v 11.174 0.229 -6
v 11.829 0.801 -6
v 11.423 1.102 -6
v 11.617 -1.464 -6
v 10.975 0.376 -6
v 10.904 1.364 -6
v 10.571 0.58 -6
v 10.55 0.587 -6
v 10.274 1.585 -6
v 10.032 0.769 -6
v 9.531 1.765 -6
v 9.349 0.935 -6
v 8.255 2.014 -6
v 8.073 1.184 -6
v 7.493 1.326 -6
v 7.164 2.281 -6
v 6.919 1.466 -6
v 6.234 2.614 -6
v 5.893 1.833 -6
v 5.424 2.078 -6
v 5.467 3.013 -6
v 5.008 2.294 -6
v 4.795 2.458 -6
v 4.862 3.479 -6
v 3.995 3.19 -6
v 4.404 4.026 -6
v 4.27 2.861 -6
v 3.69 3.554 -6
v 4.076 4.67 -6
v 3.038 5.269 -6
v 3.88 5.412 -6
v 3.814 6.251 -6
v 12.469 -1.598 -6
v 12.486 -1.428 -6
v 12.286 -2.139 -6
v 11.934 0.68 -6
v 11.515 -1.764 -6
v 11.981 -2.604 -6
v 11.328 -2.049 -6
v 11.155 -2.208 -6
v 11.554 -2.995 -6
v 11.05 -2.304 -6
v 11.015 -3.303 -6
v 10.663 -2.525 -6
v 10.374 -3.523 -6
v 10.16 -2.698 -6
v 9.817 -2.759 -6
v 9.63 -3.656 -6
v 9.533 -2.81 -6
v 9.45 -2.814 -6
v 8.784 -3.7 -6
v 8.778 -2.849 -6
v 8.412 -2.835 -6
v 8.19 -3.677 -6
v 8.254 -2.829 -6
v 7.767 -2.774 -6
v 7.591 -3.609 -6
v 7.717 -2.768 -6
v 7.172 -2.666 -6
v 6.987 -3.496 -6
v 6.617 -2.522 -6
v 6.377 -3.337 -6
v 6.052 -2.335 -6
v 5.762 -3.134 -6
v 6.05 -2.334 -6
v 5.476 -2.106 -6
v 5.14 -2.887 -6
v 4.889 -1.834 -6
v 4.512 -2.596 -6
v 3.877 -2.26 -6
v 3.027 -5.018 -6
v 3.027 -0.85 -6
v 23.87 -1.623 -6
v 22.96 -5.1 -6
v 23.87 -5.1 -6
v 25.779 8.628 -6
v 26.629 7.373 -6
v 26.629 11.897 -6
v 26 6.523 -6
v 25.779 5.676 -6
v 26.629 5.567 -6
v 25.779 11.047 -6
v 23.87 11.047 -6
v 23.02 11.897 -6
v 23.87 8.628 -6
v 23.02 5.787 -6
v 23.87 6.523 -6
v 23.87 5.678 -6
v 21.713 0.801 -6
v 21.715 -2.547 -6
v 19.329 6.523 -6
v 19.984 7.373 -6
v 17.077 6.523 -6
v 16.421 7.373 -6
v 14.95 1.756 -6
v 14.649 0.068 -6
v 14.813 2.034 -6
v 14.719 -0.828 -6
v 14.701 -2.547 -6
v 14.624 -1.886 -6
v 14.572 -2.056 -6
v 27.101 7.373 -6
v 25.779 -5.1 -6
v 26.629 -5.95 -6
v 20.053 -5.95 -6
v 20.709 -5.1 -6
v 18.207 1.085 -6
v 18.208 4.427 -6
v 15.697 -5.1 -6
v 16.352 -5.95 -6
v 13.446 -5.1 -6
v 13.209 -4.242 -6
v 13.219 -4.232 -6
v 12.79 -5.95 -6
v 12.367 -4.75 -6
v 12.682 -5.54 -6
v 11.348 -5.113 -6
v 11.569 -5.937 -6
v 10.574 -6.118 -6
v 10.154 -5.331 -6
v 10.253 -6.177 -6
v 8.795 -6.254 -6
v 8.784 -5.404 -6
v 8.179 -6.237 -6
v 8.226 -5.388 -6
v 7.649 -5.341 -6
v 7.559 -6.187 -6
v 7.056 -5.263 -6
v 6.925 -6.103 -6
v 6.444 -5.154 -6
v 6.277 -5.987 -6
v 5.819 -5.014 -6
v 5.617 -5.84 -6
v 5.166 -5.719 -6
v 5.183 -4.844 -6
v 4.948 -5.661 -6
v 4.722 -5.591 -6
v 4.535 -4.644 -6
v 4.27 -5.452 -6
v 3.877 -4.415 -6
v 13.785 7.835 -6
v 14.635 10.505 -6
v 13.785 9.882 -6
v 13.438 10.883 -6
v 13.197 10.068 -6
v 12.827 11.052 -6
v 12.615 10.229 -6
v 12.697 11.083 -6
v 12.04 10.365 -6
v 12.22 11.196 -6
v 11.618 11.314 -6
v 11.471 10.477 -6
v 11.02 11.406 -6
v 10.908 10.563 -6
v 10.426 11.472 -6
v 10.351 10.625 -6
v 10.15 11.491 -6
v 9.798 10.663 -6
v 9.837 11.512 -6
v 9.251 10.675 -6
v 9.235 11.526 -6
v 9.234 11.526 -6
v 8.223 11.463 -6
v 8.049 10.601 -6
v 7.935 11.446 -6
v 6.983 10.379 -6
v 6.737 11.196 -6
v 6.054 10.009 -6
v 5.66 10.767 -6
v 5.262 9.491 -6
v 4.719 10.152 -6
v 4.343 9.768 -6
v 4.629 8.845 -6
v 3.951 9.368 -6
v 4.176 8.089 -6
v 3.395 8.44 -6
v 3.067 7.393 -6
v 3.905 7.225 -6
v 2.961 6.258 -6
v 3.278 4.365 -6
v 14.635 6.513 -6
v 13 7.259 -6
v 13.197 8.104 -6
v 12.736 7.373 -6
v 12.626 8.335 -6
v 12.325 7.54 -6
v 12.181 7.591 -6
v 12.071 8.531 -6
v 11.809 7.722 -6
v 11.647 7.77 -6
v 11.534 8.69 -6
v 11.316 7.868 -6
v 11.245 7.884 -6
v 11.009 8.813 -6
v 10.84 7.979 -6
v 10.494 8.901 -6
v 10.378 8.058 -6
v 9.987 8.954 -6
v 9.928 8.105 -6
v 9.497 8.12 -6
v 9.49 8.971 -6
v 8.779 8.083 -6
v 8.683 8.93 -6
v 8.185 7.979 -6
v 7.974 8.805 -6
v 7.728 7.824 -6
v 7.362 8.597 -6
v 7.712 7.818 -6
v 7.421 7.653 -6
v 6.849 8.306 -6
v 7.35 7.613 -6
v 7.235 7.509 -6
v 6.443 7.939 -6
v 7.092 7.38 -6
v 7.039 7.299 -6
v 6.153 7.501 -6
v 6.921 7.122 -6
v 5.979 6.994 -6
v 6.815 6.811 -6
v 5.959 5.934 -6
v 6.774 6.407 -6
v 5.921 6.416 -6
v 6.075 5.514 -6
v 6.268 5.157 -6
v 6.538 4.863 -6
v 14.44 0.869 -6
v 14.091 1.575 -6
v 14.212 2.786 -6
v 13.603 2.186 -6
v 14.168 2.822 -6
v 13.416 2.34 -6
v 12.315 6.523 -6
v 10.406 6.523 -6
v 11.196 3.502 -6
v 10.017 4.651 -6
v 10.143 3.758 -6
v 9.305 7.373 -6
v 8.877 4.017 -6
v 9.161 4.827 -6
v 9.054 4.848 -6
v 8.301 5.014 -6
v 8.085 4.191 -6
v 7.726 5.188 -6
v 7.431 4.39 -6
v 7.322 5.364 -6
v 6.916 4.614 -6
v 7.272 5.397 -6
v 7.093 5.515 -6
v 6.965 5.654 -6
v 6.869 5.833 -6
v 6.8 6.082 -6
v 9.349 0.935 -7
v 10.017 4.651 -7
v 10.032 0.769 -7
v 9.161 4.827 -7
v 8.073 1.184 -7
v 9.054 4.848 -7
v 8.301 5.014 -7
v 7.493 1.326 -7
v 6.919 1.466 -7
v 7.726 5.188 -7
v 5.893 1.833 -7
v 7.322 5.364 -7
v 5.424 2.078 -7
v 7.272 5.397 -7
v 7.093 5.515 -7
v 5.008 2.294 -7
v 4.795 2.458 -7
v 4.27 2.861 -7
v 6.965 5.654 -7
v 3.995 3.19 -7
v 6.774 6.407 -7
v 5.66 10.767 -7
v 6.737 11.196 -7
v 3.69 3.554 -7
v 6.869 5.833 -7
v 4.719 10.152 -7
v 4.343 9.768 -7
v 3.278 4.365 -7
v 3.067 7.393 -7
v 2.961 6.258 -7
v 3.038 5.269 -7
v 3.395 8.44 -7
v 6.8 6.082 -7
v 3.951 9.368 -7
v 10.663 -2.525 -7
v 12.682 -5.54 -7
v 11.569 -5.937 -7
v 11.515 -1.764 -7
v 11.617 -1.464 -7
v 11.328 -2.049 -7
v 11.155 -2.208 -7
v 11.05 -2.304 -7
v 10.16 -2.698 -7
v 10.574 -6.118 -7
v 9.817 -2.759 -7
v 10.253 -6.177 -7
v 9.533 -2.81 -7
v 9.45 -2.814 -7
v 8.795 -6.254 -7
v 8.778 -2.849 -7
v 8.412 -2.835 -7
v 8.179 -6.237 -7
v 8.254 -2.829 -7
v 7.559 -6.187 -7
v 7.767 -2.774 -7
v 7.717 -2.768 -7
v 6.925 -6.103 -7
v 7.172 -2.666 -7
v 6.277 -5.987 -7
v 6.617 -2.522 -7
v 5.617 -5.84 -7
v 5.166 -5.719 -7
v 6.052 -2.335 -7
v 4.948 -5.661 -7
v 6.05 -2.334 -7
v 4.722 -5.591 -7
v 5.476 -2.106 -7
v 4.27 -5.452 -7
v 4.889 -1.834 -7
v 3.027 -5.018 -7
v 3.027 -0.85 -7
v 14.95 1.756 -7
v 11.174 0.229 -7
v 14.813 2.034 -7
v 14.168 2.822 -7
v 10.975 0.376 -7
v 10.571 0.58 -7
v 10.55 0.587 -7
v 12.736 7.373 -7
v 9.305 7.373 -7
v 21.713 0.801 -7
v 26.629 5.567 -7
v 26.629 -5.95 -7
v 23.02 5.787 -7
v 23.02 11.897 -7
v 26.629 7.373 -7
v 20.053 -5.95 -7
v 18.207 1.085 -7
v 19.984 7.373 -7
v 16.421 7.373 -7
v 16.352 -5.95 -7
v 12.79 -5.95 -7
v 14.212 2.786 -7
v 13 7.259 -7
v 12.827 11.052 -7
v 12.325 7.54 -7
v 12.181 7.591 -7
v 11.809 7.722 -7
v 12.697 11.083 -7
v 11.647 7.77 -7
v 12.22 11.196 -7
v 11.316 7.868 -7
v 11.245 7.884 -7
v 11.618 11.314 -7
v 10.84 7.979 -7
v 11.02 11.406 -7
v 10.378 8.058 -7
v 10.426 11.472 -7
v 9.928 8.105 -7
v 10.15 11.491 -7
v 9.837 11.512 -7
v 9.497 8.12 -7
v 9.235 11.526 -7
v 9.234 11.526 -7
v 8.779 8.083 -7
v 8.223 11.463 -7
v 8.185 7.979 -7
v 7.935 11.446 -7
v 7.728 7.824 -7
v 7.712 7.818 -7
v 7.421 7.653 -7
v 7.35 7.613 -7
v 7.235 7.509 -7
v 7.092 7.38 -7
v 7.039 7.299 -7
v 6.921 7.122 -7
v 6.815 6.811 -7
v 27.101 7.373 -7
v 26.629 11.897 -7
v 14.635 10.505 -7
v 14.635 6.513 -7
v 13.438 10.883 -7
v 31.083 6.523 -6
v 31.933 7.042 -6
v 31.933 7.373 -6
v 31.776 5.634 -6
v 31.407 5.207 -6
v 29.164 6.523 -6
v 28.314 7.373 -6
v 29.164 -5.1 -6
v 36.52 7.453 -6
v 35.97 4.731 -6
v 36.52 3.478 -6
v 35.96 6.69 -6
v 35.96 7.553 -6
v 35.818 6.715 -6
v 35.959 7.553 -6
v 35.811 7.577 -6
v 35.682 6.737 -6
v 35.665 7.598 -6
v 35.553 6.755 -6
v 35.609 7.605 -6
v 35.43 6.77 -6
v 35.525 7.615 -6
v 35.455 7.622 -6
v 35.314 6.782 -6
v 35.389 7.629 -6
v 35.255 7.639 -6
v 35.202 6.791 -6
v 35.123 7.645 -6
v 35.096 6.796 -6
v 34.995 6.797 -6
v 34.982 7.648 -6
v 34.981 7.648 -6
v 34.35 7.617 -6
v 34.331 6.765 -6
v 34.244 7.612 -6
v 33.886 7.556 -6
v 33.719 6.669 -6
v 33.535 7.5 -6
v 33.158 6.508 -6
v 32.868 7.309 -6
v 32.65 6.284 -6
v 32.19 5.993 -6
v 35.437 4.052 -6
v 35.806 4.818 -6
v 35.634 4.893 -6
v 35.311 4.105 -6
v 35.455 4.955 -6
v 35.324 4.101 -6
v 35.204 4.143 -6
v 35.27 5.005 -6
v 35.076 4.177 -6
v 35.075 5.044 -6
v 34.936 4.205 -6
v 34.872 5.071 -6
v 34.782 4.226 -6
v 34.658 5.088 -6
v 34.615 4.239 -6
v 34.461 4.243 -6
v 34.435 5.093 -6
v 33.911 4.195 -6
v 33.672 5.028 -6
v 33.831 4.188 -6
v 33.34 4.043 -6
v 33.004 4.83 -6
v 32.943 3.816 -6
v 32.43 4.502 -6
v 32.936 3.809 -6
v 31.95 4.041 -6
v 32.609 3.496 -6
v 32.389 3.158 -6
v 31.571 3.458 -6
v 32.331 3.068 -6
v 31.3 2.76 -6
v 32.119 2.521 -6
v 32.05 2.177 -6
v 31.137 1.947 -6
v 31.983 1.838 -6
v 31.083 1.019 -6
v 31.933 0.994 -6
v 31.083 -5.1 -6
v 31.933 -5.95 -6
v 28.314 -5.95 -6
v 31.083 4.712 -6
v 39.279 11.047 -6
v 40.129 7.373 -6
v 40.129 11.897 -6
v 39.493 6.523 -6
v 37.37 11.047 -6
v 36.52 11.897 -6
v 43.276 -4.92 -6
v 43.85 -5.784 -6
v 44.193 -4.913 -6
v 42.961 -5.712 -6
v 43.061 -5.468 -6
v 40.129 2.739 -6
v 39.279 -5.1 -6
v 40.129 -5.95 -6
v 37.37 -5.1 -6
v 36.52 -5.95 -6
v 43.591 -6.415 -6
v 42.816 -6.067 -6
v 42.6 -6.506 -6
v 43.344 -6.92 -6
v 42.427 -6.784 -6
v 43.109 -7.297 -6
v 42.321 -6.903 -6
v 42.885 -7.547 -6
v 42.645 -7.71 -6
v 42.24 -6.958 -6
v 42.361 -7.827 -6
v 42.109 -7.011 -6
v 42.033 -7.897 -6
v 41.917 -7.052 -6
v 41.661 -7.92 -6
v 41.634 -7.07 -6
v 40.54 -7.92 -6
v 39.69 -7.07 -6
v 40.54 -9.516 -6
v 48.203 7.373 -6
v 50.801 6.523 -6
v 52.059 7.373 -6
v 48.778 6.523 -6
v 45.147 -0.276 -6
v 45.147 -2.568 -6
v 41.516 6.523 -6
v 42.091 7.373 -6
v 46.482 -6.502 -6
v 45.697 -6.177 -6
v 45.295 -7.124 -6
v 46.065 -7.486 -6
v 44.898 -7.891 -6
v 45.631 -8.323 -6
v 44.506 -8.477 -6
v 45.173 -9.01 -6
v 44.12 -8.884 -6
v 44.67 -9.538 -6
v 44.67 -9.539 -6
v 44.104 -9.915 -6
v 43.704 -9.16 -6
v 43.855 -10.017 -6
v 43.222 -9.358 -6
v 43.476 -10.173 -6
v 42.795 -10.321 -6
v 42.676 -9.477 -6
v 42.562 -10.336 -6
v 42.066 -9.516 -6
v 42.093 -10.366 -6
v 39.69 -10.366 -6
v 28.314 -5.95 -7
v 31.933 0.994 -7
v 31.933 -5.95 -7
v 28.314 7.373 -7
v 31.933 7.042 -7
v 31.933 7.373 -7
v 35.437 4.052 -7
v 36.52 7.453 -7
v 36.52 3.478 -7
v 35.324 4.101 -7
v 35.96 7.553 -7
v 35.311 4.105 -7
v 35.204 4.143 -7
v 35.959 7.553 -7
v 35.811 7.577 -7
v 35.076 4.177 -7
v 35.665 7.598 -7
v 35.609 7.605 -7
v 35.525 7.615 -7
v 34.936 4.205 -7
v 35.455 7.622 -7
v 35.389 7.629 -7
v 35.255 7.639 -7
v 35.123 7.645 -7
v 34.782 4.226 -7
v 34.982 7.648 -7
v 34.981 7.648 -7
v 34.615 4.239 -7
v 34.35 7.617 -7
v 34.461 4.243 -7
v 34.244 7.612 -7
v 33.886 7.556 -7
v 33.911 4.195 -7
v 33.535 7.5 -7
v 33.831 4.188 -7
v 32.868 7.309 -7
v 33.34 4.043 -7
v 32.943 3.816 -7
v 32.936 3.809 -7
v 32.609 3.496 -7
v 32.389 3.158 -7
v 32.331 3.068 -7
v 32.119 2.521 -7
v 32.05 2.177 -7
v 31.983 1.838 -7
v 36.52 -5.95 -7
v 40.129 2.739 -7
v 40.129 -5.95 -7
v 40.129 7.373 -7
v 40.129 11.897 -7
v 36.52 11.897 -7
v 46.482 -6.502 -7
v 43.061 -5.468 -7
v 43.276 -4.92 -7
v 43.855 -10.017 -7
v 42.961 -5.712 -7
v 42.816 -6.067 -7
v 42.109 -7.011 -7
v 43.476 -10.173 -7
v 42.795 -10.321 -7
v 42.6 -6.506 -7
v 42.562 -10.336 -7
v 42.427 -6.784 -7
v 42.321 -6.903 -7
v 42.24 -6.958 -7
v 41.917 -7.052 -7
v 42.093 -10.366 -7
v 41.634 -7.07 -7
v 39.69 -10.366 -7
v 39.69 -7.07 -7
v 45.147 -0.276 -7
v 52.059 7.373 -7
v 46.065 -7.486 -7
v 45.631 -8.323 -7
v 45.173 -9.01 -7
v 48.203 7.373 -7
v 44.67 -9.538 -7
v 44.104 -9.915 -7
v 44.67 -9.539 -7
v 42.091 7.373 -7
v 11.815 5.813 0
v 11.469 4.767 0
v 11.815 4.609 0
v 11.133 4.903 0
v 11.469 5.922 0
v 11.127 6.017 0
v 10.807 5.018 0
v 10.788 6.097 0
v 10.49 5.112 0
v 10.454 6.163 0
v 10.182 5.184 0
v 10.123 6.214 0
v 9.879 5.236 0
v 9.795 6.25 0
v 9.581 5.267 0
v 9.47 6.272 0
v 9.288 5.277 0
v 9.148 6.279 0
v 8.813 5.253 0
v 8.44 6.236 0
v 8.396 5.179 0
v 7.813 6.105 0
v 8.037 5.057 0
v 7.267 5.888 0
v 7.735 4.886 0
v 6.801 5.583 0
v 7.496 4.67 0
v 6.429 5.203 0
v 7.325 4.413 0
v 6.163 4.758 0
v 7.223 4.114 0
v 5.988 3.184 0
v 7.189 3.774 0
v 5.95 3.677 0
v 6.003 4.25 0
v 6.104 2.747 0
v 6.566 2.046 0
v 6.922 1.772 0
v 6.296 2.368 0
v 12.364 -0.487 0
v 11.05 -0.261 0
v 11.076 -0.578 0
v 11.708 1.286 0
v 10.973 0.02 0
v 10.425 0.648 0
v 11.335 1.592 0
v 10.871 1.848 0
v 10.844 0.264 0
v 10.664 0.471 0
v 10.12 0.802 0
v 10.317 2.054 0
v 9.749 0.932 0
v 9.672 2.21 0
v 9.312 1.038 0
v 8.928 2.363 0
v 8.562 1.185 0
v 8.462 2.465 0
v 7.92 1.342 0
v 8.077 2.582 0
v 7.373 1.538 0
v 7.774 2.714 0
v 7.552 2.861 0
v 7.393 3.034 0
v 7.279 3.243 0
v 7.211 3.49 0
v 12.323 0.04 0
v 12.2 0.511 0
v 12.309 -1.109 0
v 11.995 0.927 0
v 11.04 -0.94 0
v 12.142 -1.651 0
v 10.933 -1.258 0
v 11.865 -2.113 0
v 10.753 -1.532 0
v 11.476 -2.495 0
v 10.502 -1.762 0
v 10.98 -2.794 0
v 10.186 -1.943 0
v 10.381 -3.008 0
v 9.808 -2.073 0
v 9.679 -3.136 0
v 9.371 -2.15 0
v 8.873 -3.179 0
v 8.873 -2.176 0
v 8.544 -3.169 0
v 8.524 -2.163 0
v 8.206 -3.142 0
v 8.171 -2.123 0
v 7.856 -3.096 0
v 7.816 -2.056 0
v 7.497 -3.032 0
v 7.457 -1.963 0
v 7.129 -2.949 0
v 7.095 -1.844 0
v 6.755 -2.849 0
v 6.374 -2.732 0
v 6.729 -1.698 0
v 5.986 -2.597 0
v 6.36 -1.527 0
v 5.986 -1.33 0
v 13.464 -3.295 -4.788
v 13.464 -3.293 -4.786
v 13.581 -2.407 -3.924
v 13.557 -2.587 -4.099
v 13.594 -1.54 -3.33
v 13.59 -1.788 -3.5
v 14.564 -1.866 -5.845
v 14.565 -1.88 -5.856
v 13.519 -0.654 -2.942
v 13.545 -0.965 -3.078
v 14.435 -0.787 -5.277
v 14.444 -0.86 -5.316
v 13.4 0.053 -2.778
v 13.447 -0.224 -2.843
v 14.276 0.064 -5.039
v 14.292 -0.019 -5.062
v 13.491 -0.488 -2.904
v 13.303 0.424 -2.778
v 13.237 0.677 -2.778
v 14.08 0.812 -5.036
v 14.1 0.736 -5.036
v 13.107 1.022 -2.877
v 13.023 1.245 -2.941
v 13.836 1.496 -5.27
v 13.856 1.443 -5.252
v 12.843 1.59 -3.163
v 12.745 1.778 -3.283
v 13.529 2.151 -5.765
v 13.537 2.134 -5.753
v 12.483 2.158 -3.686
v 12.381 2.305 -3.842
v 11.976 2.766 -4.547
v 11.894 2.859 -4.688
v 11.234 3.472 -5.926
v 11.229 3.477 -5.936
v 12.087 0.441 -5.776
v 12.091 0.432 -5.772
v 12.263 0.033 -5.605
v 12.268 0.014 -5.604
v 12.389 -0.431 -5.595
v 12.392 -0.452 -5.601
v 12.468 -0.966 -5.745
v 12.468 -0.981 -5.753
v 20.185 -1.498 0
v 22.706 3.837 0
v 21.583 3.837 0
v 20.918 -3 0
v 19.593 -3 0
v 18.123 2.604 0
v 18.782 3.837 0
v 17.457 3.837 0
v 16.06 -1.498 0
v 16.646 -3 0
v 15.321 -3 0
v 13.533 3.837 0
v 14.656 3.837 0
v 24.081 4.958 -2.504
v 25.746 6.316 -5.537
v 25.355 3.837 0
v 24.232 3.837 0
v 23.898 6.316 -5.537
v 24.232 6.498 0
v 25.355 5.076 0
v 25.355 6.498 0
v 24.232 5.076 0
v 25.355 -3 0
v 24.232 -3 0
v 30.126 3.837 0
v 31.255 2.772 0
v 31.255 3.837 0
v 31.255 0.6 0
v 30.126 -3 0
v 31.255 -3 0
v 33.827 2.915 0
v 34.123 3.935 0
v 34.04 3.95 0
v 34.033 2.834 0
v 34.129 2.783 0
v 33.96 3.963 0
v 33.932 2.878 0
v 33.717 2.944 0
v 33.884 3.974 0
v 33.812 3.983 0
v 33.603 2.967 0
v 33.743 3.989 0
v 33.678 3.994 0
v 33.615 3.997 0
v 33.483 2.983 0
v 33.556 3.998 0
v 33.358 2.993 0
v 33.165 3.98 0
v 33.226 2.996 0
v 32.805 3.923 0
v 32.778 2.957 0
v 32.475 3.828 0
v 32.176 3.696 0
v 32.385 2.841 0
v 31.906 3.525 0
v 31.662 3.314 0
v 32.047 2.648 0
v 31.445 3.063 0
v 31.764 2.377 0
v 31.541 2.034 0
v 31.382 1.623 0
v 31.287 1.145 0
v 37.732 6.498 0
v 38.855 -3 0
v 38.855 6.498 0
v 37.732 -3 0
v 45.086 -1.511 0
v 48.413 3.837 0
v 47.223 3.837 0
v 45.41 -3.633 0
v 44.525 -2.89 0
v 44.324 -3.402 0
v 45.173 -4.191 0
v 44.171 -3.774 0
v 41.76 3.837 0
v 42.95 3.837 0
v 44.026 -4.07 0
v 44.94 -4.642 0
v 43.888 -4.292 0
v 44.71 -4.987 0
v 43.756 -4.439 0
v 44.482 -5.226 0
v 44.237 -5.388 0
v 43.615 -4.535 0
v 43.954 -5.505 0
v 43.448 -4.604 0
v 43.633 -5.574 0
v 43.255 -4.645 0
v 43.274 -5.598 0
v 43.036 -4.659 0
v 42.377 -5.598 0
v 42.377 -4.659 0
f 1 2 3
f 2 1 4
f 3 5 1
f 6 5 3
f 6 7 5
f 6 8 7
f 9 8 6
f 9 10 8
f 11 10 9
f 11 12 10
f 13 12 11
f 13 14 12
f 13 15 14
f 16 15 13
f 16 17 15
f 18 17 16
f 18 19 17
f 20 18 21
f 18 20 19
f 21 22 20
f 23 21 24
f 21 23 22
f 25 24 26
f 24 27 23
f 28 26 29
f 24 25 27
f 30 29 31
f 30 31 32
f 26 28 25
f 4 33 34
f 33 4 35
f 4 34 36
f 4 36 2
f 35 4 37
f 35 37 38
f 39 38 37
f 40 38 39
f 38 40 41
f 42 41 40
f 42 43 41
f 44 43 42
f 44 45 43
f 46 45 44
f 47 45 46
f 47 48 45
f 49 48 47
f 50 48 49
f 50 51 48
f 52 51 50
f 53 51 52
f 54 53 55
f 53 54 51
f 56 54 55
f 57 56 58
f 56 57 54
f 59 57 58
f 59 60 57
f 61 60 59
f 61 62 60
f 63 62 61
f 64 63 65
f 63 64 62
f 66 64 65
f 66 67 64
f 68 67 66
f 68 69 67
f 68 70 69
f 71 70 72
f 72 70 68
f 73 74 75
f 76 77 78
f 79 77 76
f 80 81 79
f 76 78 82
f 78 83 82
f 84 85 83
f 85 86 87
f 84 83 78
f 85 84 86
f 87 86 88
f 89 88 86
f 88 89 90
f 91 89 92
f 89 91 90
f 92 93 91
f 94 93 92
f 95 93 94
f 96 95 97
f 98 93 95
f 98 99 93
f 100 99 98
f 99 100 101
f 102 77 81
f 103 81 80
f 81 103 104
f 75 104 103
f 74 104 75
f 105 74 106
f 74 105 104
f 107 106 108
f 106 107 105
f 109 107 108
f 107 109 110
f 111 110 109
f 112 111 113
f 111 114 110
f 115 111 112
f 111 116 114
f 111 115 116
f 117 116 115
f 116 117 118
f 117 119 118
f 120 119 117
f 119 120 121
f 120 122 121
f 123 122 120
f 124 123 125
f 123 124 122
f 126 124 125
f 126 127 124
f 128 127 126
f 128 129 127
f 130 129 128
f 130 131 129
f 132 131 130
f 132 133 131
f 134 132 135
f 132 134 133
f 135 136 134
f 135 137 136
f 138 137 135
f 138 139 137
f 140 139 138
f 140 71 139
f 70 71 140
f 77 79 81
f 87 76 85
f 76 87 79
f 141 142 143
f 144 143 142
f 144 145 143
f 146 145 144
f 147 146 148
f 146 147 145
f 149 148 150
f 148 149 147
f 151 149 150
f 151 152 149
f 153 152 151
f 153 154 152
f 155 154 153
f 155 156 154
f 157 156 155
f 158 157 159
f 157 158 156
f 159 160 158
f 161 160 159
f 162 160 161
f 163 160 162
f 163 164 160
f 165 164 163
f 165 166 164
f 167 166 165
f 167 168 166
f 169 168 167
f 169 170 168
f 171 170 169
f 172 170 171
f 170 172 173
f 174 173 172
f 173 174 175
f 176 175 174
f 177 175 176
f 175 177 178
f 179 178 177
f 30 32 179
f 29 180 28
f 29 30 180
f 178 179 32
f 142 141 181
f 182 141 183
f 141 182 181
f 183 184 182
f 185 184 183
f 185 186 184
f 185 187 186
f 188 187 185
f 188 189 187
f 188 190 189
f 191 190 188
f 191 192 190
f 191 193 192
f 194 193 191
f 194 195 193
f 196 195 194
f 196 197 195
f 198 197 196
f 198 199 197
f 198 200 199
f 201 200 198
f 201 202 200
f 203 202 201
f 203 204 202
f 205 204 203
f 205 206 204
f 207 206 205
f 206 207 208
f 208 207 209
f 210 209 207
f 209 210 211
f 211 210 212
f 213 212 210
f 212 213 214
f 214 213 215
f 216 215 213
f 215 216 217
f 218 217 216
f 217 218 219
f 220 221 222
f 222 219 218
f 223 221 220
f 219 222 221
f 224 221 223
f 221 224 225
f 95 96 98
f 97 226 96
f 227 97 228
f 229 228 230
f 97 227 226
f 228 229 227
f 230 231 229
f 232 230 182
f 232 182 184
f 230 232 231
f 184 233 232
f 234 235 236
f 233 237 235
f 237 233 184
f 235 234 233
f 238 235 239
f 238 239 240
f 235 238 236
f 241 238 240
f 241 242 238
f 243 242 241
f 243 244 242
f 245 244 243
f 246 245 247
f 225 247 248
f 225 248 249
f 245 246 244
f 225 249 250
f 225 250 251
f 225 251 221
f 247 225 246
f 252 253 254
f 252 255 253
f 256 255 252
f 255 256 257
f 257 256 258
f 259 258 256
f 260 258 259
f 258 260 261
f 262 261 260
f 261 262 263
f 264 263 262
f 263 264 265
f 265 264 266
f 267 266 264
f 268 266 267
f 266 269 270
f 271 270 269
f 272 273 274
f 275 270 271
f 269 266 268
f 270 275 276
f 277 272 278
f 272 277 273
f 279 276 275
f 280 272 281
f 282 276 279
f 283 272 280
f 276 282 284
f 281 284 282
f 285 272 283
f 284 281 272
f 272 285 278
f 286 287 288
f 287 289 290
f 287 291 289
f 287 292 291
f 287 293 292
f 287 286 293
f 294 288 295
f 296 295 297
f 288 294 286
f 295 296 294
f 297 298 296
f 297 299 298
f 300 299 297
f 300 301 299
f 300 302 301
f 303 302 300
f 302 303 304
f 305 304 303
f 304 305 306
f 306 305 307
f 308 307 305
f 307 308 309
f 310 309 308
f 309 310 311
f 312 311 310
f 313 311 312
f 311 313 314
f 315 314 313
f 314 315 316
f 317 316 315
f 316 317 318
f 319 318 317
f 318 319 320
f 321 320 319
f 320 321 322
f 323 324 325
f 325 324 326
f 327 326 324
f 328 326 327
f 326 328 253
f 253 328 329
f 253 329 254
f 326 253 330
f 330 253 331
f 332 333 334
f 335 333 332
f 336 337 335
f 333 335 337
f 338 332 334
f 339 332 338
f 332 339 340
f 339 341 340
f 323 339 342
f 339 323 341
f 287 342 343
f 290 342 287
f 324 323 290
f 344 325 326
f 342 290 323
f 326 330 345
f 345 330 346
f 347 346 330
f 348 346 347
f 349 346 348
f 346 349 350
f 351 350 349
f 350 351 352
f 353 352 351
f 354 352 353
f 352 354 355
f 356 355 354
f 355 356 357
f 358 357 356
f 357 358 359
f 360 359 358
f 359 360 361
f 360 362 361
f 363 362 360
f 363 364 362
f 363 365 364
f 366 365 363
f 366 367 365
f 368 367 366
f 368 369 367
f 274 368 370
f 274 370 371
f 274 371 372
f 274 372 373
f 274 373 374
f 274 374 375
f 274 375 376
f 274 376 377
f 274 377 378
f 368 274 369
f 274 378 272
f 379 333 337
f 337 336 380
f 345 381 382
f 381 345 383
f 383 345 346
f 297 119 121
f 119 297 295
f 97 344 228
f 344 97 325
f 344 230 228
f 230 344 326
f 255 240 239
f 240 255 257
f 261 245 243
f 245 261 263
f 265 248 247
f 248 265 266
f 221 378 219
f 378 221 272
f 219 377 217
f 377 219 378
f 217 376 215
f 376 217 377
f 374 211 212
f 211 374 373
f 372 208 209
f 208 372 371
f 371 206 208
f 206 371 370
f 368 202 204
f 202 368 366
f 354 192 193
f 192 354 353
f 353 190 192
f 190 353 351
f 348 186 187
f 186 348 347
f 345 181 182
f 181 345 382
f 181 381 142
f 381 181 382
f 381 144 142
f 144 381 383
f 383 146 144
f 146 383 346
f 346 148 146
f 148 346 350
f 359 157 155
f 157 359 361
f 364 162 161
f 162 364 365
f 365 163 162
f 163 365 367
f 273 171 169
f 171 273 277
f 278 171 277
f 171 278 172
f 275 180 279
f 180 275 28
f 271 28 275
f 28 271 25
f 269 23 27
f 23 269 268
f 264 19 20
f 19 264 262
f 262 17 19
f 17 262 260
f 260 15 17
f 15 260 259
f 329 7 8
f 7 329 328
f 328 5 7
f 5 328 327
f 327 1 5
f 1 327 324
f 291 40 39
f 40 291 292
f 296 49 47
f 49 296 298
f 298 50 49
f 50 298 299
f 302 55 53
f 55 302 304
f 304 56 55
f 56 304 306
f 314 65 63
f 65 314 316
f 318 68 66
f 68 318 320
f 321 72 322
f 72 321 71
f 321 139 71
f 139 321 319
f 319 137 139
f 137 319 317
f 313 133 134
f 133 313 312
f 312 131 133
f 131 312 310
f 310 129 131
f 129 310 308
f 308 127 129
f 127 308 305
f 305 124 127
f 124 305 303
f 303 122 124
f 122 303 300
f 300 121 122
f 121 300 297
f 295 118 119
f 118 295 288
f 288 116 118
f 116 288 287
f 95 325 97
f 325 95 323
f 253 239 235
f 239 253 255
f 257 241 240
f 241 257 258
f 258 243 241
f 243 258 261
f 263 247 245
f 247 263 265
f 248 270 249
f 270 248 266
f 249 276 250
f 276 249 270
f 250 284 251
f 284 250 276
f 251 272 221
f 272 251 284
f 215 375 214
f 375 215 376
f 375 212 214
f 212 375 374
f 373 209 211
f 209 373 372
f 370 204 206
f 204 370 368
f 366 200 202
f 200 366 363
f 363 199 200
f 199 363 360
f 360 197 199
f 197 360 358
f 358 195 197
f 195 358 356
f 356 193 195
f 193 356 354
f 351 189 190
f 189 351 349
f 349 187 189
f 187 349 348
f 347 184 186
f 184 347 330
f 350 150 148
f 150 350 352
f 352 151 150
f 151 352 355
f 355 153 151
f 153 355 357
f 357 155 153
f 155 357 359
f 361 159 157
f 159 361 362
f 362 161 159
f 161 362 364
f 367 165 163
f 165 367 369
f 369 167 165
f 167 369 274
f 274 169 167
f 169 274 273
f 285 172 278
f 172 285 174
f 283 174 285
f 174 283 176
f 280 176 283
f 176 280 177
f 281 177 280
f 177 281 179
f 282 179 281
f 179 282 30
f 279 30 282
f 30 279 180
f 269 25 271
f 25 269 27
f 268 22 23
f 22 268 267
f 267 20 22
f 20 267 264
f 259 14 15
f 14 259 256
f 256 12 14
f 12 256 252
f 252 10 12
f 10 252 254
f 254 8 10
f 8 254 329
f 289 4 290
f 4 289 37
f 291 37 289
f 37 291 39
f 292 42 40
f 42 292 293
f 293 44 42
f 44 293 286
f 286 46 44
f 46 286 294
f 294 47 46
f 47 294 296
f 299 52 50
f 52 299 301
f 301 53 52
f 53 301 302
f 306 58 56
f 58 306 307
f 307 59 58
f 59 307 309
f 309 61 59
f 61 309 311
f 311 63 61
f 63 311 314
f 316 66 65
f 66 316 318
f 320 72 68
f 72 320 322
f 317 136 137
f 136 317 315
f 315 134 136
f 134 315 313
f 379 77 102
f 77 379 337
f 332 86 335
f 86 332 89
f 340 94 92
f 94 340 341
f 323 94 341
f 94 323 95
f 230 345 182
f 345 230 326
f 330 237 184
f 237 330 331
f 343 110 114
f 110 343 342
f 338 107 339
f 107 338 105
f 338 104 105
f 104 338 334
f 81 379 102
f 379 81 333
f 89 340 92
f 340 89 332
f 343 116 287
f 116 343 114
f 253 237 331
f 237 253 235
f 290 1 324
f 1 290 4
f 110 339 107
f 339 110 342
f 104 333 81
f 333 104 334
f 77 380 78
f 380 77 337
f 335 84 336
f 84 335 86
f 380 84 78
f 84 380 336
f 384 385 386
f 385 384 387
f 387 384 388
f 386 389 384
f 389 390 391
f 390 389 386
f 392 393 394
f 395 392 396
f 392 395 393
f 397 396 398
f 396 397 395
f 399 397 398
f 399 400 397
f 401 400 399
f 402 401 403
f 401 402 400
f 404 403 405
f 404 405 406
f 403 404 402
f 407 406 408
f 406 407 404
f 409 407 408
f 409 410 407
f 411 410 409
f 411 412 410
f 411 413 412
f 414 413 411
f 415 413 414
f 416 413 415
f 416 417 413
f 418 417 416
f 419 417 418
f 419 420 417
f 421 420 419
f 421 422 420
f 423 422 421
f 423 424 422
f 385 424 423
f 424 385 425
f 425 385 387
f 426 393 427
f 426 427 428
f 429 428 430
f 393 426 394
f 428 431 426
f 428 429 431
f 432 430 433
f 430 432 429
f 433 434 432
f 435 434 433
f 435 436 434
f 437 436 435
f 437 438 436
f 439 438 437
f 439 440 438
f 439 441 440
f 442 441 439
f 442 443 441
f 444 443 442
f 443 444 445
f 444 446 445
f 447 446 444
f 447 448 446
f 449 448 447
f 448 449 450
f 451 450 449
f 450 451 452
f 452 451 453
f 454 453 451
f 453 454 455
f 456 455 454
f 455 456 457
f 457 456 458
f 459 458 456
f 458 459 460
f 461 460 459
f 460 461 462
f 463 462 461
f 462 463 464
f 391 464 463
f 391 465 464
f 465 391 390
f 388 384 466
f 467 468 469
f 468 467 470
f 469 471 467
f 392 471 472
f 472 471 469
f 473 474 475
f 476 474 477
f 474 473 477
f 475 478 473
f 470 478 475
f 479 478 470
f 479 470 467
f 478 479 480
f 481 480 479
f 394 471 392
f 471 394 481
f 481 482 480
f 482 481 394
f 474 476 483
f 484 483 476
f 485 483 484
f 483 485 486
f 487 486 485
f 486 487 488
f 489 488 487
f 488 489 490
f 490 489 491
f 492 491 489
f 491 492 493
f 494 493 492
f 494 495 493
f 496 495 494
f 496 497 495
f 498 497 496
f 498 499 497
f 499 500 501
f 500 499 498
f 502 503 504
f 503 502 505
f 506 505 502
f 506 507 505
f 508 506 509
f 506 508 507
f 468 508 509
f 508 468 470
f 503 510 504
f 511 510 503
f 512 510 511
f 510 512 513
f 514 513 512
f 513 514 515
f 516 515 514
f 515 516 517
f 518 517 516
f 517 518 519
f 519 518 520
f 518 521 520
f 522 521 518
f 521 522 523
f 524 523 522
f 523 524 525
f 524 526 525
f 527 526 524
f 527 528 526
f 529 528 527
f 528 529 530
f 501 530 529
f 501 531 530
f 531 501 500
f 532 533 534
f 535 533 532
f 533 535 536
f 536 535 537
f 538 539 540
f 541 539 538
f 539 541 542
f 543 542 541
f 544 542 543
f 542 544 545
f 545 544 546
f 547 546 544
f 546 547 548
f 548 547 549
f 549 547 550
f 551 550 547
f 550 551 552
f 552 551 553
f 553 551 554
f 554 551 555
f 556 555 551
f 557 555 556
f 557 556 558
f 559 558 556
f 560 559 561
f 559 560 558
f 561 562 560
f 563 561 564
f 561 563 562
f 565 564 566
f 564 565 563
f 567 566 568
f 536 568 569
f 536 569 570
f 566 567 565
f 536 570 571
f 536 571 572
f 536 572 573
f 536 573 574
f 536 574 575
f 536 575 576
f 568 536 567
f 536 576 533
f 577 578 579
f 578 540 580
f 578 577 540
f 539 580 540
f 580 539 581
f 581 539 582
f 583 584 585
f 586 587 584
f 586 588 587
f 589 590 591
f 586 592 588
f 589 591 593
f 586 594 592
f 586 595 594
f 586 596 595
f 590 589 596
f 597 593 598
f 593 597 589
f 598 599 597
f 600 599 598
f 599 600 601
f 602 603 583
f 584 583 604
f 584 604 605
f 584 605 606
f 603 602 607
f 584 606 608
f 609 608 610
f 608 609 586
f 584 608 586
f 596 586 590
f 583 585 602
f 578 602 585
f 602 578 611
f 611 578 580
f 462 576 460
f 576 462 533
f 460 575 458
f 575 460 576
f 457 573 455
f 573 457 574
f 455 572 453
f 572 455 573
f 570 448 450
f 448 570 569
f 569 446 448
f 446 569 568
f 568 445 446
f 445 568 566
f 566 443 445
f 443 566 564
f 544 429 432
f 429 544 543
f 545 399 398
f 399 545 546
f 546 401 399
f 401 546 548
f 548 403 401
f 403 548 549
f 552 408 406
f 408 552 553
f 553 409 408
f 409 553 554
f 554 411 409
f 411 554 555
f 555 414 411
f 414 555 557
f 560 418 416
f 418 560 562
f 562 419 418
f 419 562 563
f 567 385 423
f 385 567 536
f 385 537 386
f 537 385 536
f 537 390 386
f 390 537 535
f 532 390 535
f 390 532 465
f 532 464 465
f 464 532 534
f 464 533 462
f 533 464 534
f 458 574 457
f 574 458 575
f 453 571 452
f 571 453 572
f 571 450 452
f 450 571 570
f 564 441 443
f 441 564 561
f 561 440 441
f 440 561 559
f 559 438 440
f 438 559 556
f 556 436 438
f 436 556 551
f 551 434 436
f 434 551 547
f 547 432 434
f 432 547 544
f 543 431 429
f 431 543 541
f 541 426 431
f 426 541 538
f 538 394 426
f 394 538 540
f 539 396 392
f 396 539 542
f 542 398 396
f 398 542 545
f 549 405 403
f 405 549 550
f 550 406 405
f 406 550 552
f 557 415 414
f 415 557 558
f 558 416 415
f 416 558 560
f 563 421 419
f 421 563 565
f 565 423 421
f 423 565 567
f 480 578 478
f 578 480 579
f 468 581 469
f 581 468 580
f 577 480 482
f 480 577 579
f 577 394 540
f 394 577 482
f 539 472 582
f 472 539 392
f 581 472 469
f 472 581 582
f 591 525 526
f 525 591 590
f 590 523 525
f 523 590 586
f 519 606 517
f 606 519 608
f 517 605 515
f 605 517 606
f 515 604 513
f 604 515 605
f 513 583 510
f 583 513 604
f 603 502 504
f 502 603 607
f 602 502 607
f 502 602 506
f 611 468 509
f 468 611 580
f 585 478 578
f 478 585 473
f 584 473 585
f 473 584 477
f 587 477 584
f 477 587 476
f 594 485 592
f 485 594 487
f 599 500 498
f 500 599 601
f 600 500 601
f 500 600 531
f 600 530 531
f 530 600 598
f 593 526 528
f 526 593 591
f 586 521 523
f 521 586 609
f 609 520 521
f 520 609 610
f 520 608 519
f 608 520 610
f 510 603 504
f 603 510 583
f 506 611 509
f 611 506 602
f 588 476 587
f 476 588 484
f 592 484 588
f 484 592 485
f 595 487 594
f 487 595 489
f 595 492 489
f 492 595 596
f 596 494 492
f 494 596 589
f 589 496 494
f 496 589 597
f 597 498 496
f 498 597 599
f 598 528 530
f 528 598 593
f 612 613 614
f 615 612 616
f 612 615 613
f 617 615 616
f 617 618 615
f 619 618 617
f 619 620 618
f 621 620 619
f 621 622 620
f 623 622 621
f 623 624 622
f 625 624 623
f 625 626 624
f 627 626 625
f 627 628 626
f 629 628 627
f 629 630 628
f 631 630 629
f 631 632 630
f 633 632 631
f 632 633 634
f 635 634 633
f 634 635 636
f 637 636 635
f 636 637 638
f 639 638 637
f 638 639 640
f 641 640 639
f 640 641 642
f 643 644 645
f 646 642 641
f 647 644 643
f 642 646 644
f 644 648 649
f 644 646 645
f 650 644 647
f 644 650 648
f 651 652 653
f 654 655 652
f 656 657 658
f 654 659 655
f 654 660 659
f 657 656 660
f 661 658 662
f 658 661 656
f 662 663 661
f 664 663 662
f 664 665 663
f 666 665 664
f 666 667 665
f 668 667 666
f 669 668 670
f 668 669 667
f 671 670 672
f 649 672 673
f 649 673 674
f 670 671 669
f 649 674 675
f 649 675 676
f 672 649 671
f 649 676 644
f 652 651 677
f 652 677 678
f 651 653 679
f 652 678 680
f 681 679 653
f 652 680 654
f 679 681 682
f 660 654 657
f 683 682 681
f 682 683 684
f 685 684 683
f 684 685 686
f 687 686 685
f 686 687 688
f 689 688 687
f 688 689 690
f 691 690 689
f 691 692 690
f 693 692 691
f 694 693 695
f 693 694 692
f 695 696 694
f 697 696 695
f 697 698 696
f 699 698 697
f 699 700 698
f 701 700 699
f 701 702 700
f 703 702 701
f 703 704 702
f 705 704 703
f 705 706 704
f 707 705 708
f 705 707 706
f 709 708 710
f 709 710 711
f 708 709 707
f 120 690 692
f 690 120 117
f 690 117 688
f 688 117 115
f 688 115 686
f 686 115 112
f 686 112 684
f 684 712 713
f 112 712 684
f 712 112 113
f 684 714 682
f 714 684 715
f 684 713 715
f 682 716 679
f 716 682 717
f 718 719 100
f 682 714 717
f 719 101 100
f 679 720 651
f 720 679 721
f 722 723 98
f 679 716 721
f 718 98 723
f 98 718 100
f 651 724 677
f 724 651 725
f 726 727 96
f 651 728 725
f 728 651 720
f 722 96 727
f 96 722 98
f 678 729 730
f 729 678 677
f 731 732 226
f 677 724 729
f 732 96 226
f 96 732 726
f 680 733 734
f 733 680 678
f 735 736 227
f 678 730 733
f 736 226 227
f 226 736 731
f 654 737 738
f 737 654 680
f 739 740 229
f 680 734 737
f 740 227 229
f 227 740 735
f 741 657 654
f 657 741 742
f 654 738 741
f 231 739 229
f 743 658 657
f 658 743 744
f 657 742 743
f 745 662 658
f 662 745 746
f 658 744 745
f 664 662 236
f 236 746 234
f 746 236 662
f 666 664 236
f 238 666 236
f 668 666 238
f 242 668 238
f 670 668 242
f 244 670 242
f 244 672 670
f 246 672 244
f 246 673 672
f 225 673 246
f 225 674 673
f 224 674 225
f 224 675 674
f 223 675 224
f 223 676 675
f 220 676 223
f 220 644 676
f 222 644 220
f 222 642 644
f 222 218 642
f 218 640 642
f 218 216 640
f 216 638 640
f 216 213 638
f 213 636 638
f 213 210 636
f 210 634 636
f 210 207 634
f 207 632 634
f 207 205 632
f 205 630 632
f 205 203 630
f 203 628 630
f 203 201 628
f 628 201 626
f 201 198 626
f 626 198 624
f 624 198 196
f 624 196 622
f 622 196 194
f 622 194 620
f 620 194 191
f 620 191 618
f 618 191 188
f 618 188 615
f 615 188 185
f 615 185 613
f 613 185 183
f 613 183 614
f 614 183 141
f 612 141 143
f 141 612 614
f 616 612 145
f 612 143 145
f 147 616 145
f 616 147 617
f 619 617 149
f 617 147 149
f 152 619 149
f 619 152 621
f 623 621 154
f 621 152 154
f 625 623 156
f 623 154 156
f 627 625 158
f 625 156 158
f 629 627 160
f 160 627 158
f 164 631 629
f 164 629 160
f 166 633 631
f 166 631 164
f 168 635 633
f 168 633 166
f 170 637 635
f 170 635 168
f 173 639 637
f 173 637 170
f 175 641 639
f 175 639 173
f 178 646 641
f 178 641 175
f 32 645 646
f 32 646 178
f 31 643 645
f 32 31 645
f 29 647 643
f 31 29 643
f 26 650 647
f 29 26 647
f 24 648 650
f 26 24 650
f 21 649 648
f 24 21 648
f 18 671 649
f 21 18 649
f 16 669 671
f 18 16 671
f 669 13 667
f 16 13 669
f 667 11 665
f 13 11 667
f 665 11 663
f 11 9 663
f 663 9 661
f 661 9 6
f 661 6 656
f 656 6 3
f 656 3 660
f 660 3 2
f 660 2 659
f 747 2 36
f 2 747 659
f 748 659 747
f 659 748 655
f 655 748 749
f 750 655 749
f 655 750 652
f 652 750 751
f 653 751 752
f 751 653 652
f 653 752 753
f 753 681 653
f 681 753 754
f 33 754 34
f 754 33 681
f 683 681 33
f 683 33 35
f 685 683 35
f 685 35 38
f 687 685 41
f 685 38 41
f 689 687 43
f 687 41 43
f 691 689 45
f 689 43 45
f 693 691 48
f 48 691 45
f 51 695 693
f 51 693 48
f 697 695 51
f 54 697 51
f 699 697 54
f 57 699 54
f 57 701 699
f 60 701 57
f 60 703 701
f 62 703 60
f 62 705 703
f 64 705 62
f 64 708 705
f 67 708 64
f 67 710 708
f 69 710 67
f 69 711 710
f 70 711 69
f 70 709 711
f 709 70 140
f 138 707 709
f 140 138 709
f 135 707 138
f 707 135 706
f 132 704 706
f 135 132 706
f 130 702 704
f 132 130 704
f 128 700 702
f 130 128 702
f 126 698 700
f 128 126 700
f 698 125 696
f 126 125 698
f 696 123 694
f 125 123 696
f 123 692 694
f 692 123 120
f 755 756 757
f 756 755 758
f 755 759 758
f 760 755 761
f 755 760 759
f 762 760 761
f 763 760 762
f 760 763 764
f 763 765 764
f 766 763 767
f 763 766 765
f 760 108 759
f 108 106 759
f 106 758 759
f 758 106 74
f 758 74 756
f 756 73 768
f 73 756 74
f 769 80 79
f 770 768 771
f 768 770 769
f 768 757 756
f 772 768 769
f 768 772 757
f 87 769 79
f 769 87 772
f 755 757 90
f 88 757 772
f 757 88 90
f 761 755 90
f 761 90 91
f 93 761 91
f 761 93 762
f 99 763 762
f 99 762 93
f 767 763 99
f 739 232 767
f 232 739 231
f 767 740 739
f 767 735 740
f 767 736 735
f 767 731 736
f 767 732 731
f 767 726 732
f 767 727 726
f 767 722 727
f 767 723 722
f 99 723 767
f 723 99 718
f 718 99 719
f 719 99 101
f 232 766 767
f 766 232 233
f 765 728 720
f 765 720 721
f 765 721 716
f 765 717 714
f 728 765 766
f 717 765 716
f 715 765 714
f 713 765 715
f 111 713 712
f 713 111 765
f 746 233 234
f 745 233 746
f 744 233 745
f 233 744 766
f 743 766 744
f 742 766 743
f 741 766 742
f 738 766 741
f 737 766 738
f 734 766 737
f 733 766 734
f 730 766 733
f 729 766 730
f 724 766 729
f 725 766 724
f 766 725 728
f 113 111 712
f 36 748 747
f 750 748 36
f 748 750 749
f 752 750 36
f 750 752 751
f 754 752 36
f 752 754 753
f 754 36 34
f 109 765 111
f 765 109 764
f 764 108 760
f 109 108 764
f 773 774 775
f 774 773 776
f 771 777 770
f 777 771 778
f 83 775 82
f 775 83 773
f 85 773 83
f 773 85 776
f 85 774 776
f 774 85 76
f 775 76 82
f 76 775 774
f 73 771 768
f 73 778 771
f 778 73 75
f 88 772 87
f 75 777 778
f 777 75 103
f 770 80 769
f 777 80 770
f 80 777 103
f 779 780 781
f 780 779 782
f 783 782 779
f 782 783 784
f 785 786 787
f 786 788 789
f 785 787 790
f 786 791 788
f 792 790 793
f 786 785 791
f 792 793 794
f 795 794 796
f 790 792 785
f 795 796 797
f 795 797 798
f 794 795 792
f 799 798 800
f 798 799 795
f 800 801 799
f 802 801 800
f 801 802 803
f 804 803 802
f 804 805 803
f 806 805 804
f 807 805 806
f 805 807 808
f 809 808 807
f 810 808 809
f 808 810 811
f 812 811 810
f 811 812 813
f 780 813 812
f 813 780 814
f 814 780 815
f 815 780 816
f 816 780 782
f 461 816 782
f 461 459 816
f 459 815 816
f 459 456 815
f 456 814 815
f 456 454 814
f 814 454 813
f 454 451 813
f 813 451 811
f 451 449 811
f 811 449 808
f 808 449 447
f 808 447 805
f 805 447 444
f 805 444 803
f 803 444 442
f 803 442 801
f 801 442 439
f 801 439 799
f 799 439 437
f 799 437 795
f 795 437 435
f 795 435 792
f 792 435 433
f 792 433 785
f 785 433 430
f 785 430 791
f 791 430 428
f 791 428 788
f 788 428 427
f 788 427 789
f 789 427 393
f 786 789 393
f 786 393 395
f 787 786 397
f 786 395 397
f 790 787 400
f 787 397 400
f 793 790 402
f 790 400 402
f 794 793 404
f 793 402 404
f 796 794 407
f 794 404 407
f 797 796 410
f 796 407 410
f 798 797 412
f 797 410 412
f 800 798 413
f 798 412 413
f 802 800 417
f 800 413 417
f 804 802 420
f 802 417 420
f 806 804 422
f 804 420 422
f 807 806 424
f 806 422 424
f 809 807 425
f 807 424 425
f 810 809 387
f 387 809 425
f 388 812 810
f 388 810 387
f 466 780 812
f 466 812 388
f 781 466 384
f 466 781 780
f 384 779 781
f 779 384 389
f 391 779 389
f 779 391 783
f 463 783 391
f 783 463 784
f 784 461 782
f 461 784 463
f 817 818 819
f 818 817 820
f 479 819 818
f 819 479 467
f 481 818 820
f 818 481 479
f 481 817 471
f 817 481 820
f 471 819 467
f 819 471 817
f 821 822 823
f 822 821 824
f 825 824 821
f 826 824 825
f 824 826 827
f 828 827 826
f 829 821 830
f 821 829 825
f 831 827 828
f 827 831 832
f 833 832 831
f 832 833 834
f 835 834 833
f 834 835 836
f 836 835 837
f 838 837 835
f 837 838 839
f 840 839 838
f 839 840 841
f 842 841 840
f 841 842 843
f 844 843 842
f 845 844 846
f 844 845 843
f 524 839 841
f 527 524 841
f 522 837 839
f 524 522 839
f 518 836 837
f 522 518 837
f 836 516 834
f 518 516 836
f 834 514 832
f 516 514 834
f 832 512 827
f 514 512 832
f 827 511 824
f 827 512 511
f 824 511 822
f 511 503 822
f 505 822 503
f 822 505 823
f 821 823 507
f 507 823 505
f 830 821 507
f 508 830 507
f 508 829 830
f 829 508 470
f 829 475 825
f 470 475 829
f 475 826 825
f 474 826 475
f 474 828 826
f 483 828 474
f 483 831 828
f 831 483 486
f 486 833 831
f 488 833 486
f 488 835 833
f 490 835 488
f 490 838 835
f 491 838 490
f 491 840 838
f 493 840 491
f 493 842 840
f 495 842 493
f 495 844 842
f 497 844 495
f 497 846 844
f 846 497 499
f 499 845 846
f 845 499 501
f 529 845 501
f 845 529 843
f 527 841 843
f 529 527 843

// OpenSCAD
//Set the text to render
textstring="Swirly";

//Font name. In the list is first a selection of bold fonts. After the dashed line you get a list of thinner fonts, which are not really recommended.
fontname="Henny Penny"; //[Vivian,Holtwood One SC,Alegreya Sans SC Black,Alfa Slab One,Asset,Black Ops One,Bowlby One,Bowlby One SC,Chango,Cinzel Decorative Black,Coustard,Elsie Black,Elsie Swash Caps Black,Erica One,Exo2 Black,Fascinate,Lobster,PassionOne,Plaster,Poller One,Rammetto One,Ruslan Display,Sarpanch Black,Sigmar One,Sonsie One,Titan One,Ultra,Hanalei,---------,ABeeZee,Abel,Abril Fatface,Aclonica,Acme,Actor,Adamina,Advent Pro,Aguafina Script,Akronim,Aladin,Aldrich,Alef,Alex Brush,Alice,Alike,Alike Angular,Allan,Allerta,Allerta Stencil,Allura,Almendra,Almendra Display,Almendra SC,Amarante,Amaranth,Amatic SC,Amethysta,Amiri,Anaheim,Andada,Andika,Angkor,Annie Use Your Telescope,Anonymous Pro,Antic,Antic Didone,Antic Slab,Anton,Arapey,Arbutus,Arbutus Slab,Architects Daughter,Archivo Black,Archivo Narrow,Arimo,Arizonia,Armata,Artifika,Arvo,Asap,Asset,Astloch,Asul,Atomic Age,Aubrey,Audiowide,Autour One,Average,Average Sans,Averia Gruesa Libre,Averia Libre,Averia Sans Libre,Averia Serif Libre,Bad Script,Balthazar,Bangers,Basic,Battambang,Baumans,Bayon,Belgrano,Belleza,BenchNine,Bentham,Berkshire Swash,Bevan,Bigelow Rules,Bigshot One,Bilbo,Bilbo Swash Caps,Bitter,Black Ops One,Bokor,Bonbon,Boogaloo,Bowlby One,Bowlby One SC,Brawler,Bree Serif,Bubblegum Sans,Bubbler One,Buda,Buenard,Butcherman,Butterfly Kids,Cabin,Cabin Condensed,Cabin Sketch,Caesar Dressing,Cagliostro,Calligraffitti,Cambay,Cambo,Candal,Cantarell,Cantata One,Cantora One,Capriola,Cardo,Carme,Carrois Gothic,Carrois Gothic SC,Carter One,Caudex,Cedarville Cursive,Ceviche One,Changa One,Chango,Chau Philomene One,Chela One,Chelsea Market,Chenla,Cherry Cream Soda,Cherry Swash,Chewy,Chicle,Chivo,Cinzel,Cinzel Decorative,Clicker Script,Coda,Coda Caption,Codystar,Combo,Comfortaa,Coming Soon,Concert One,Condiment,Content,Contrail One,Convergence,Cookie,Copse,Corben,Courgette,Cousine,Coustard,Covered By Your Grace,Crafty Girls,Creepster,Crete Round,Crimson Text,Croissant One,Crushed,Cuprum,Cutive,Cutive Mono,Damion,Dancing Script,Dangrek,Dawning of a New Day,Days One,Dekko,Delius,Delius Swash Caps,Delius Unicase,Della Respira,Denk One,Devonshire,Dhurjati,Didact Gothic,Diplomata,Diplomata SC,Domine,Donegal One,Doppio One,Dorsa,Dosis,Dr Sugiyama,Droid Sans,Droid Sans Mono,Droid Serif,Duru Sans,Dynalight,Eagle Lake,Eater,EB Garamond,Economica,Ek Mukta,Electrolize,Elsie,Elsie Swash Caps,Emblema One,Emilys Candy,Engagement,Englebert,Enriqueta,Erica One,Esteban,Euphoria Script,Ewert,Exo,Exo 2,Expletus Sans,Fanwood Text,Fascinate,Fascinate Inline,Faster One,Fasthand,Fauna One,Federant,Federo,Felipa,Fenix,Finger Paint,Fira Mono,Fira Sans,Fjalla One,Fjord One,Flamenco,Flavors,Fondamento,Fontdiner Swanky,Forum,Francois One,Freckle Face,Fredericka the Great,Fredoka One,Freehand,Fresca,Frijole,Fruktur,Fugaz One,Gabriela,Gafata,Galdeano,Galindo,Gentium Basic,Gentium Book Basic,Geo,Geostar,Geostar Fill,Germania One,GFS Didot,GFS Neohellenic,Gidugu,Gilda Display,Give You Glory,Glass Antiqua,Glegoo,Gloria Hallelujah,Goblin One,Gochi Hand,Gorditas,Goudy Bookletter 1911,Graduate,Grand Hotel,Gravitas One,Great Vibes,Griffy,Gruppo,Gudea,Gurajada,Habibi,Halant,Hammersmith One,Hanalei,Hanalei Fill,Handlee,Hanuman,Happy Monkey,Headland One,Henny Penny,Herr Von Muellerhoff,Hind,Homemade Apple,Homenaje,Iceberg,Iceland,IM Fell Double Pica,IM Fell Double Pica SC,IM Fell DW Pica,IM Fell DW Pica SC,IM Fell English,IM Fell English SC,IM Fell French Canon,IM Fell French Canon SC,IM Fell Great Primer,IM Fell Great Primer SC,Imprima,Inconsolata,Inder,Indie Flower,Inika,Irish Grover,Istok Web,Italiana,Italianno,Jacques Francois,Jacques Francois Shadow,Jim Nightshade,Jockey One,Jolly Lodger,Josefin Sans,Josefin Slab,Joti One,Judson,Julee,Julius Sans One,Junge,Jura,Just Another Hand,Just Me Again Down Here,Kalam,Kameron,Kantumruy,Karla,Karma,Kaushan Script,Kavoon,Kdam Thmor,Keania One,Kelly Slab,Kenia,Khand,Khmer,Khula,Kite One,Knewave,Kotta One,Koulen,Kranky,Kreon,Kristi,Krona One,La Belle Aurore,Laila,Lakki Reddy,Lancelot,Lateef,Lato,League Script,Leckerli One,Ledger,Lekton,Lemon,Liberation Sans,Libre Baskerville,Life Savers,Lilita One,Lily Script One,Limelight,Linden Hill,Lobster,Lobster Two,Londrina Outline,Londrina Shadow,Londrina Sketch,Londrina Solid,Lora,Love Ya Like A Sister,Loved by the King,Lovers Quarrel,Luckiest Guy,Lusitana,Lustria,Macondo,Macondo Swash Caps,Magra,Maiden Orange,Mako,Mallanna,Mandali,Marcellus,Marcellus SC,Marck Script,Margarine,Marko One,Marmelad,Martel Sans,Marvel,Mate,Mate SC,Maven Pro,McLaren,Meddon,MedievalSharp,Medula One,Megrim,Meie Script,Merienda,Merienda One,Merriweather,Merriweather Sans,Metal,Metal Mania,Metamorphous,Metrophobic,Michroma,Milonga,Miltonian,Miltonian Tattoo,Miniver,Miss Fajardose,Modak,Modern Antiqua,Molengo,Molle,Monda,Monofett,Monoton,Monsieur La Doulaise,Montaga,Montez,Montserrat,Montserrat Alternates,Montserrat Subrayada,Moul,Moulpali,Mountains of Christmas,Mouse Memoirs,Mr Bedfort,Mr Dafoe,Mr De Haviland,Mrs Saint Delafield,Mrs Sheppards,Muli,Mystery Quest,Neucha,Neuton,New Rocker,News Cycle,Niconne,Nixie One,Nobile,Nokora,Norican,Nosifer,Nothing You Could Do,Noticia Text,Noto Sans,Noto Serif,Nova Cut,Nova Flat,Nova Mono,Nova Oval,Nova Round,Nova Script,Nova Slim,Nova Square,NTR,Numans,Nunito,Odor Mean Chey,Offside,Old Standard TT,Oldenburg,Oleo Script,Oleo Script Swash Caps,Open Sans,Open Sans Condensed,Oranienbaum,Orbitron,Oregano,Orienta,Original Surfer,Oswald,Over the Rainbow,Overlock,Overlock SC,Ovo,Oxygen,Oxygen Mono,Pacifico,Paprika,Parisienne,Passero One,Passion One,Pathway Gothic One,Patrick Hand,Patrick Hand SC,Patua One,Paytone One,Peddana,Peralta,Permanent Marker,Petit Formal Script,Petrona,Philosopher,Piedra,Pinyon Script,Pirata One,Plaster,Play,Playball,Playfair Display,Playfair Display SC,Podkova,Poiret One,Poller One,Poly,Pompiere,Pontano Sans,Port Lligat Sans,Port Lligat Slab,Prata,Preahvihear,Press Start 2P,Princess Sofia,Prociono,Prosto One,PT Mono,PT Sans,PT Sans Caption,PT Sans Narrow,PT Serif,PT Serif Caption,Puritan,Purple Purse,Quando,Quantico,Quattrocento,Quattrocento Sans,Questrial,Quicksand,Quintessential,Qwigley,Racing Sans One,Radley,Rajdhani,Raleway,Raleway Dots,Ramabhadra,Ramaraja,Rambla,Rammetto One,Ranchers,Rancho,Ranga,Rationale,Ravi Prakash,Redressed,Reenie Beanie,Revalia,Ribeye,Ribeye Marrow,Righteous,Risque,Roboto,Roboto Condensed,Roboto Slab,Rochester,Rock Salt,Rokkitt,Romanesco,Ropa Sans,Rosario,Rosarivo,Rouge Script,Rozha One,Rubik Mono One,Rubik One,Ruda,Rufina,Ruge Boogie,Ruluko,Rum Raisin,Ruslan Display,Russo One,Ruthie,Rye,Sacramento,Sail,Salsa,Sanchez,Sancreek,Sansita One,Sarina,Sarpanch,Satisfy,Scada,Scheherazade,Schoolbell,Seaweed Script,Sevillana,Seymour One,Shadows Into Light,Shadows Into Light Two,Shanti,Share,Share Tech,Share Tech Mono,Shojumaru,Short Stack,Siemreap,Sigmar One,Signika,Signika Negative,Simonetta,Sintony,Sirin Stencil,Six Caps,Skranji,Slabo 13px,Slabo 27px,Slackey,Smokum,Smythe,Sniglet,Snippet,Snowburst One,Sofadi One,Sofia,Sonsie One,Sorts Mill Goudy,Source Code Pro,Source Sans Pro,Source Serif Pro,Special Elite,Spicy Rice,Spinnaker,Spirax,Squada One,Sree Krushnadevaraya,Stalemate,Stalinist One,Stardos Stencil,Stint Ultra Condensed,Stint Ultra Expanded,Stoke,Strait,Sue Ellen Francisco,Sunshiney,Supermercado One,Suranna,Suravaram,Suwannaphum,Swanky and Moo Moo,Syncopate,Tangerine,Taprom,Tauri,Teko,Telex,Tenali Ramakrishna,Tenor Sans,Text Me One,The Girl Next Door,Tienne,Timmana,Tinos,Titan One,Titillium Web,Trade Winds,Trocchi,Trochut,Trykker,Tulpen One,Ubuntu,Ubuntu Condensed,Ubuntu Mono,Ultra,Uncial Antiqua,Underdog,Unica One,UnifrakturCook,UnifrakturMaguntia,Unkempt,Unlock,Unna,Vampiro One,Varela,Varela Round,Vast Shadow,Vesper Libre,Vibur,Vidaloka,Viga,Voces,Volkhov,Vollkorn,Voltaire,VT323,Waiting for the Sunrise,Wallpoet,Walter Turncoat,Warnes,Wellfleet,Wendy One,Wire One,Yanone Kaffeesatz,Yellowtail,Yeseva One,Yesteryear,Zeyada]

//type
type="tag"; //[container, tag, hollow]

//where to extrude
shiftit=0.3;

//scaling up
scale=1.7;

//Text height (extrusion) in mm
textheight=6;

//Set font size in mm
textsize=10; 

//wall thickness
wall=1;

//text kerning - in font size
width_factor=.9;

//rim to combine the text
rim=0.5;

//close gaps e.g. to the dot of an i...
delta=0.5;
    


/* [Hidden] */
//-------------------------------------------------------------------------------
function is_monospaced() = 
    (fontname=="Cutive Mono" || fontname=="Droid Sans Mono" ||fontname=="Fira Mono" ||fontname=="Nova Mono" ||fontname=="PT Mono" ||fontname=="Rubik Mono" ||fontname=="Share Tech Mono" ||fontname=="Ubuntu Mono" || fontname=="Oxygen Mono" )? 1 : 0;

echo (is_monospaced()) ;
width_big=textsize*width_factor;
width_small=textsize*width_factor*(is_monospaced()==1?1:.75);
width_small_half=width_small*(is_monospaced()==1?1:.5);
width_tiny=textsize*width_factor*(is_monospaced()==1?1:.25);
width_tiny_half=width_tiny*(is_monospaced()==1?1:.5);
echo (width_big, width_small, width_tiny);

function is_narrow_letter(c) =
    (c=="t" ||c=="f" || c=="l" || c=="i" || c=="j") ? 1 : 0;
function is_space(c) =
    (c=="." ||c==";" || c==" ") ? 1 : 0;
function width(c,d) = 
    (is_narrow_letter(c)==1 && is_narrow_letter(d)==1) ? width_small_half : 
    (is_narrow_letter(c)==1 || is_narrow_letter(d)==1) ? width_small : 
    (is_space(c)==1 && is_space(d)==1) ? width_tiny_half : 
    (is_space(c)==1 || is_space(d)==1) ? width_tiny : 
    width_big;
    
function widthfunction(i) = width(textstring[i-1],textstring[i-2]);
function totalwidthfunction(x) = x < 1 ? 0 : widthfunction(x) + totalwidthfunction(x - 1);
//input = [1, 3, 5, 8];
width = [for (a = [ 1 : len(textstring) ]) totalwidthfunction(a) ];
echo(width); // ECHO: [1, 6, 15, 36]

dummy_cutoutlen=len(textstring)*textsize;

/*
Chamfered Text 
Version 7, September 2018
Written by MC Geisler (mcgenki at gmail dot com)

A text for your customization...
Have fun!

License: Attribution 4.0 International (CC BY 4.0)

You are free to:
    Share - copy and redistribute the material in any medium or format
    Adapt - remix, transform, and build upon the material
    for any purpose, even commercially.
*/

    
module writetext(textstr, sizeit)
{
    text(textstr,size=sizeit*.9,font=fontname,halign="center",valign="baseline");
}

module RiseText(textstr, textsize,textheight) 
{
    difference()
    {
        union()
        {
            for(i=[0:1:len(textstr)-1])
            {
                //extruded text
                translate([width[i],0,0])
                    linear_extrude(height=textheight,convexity = 32, scale = scale)
                        translate([0,-textsize*shiftit,0])
                            writetext(textstr[i], textsize);
                               
                //backplane
                if(type=="tag")
                {
                    translate([width[i],0,textheight-0*wall])
                        linear_extrude(height=wall,convexity = 32)
                            scale([scale,scale,1])
                                translate([0,-textsize*shiftit,0])
                                    offset(delta=-delta)   
                                        offset(delta=delta+rim)
                                            writetext(textstr[i], textsize);     


                    translate([width[i],0,textheight-0*wall])
                        linear_extrude(height=wall,convexity = 32)
                                    scale([scale,scale,1])
                                       translate([0,-textsize*shiftit,0])
                                            offset(delta=rim)
                                                writetext(textstr[i], textsize);      
                }
            }

        
        }

        if (type=="container")
        {
            translate([0,0,wall])
                for(i=[0:1:len(textstr)-1])
                {
                    translate([width[i],0,0])
                        linear_extrude(height=textheight,convexity = 32, scale = scale)
                            translate([0,-textsize*shiftit,0])
                                offset(delta=-wall)
                                    writetext(textstr[i], textsize);
                }
        }
    
 
        if (type=="hollow")
        scale([1,1,1])
            translate([0,0,-wall])
                for(i=[0:1:len(textstr)-1])
                {
                    translate([width[i],0,0])
                        linear_extrude(height=textheight,convexity = 32, scale = 0.3)
                            translate([0,-textsize*shiftit,0])
                               //offset(delta=-wall)
                                    writetext(textstr[i], textsize);
                }
    
    
    }
}


if (type=="tag" || type=="hollow")
{
   scale([1,1,-1])
        RiseText(textstring,textsize,textheight);
}
else
{
    RiseText(textstring,textsize,textheight);
}
